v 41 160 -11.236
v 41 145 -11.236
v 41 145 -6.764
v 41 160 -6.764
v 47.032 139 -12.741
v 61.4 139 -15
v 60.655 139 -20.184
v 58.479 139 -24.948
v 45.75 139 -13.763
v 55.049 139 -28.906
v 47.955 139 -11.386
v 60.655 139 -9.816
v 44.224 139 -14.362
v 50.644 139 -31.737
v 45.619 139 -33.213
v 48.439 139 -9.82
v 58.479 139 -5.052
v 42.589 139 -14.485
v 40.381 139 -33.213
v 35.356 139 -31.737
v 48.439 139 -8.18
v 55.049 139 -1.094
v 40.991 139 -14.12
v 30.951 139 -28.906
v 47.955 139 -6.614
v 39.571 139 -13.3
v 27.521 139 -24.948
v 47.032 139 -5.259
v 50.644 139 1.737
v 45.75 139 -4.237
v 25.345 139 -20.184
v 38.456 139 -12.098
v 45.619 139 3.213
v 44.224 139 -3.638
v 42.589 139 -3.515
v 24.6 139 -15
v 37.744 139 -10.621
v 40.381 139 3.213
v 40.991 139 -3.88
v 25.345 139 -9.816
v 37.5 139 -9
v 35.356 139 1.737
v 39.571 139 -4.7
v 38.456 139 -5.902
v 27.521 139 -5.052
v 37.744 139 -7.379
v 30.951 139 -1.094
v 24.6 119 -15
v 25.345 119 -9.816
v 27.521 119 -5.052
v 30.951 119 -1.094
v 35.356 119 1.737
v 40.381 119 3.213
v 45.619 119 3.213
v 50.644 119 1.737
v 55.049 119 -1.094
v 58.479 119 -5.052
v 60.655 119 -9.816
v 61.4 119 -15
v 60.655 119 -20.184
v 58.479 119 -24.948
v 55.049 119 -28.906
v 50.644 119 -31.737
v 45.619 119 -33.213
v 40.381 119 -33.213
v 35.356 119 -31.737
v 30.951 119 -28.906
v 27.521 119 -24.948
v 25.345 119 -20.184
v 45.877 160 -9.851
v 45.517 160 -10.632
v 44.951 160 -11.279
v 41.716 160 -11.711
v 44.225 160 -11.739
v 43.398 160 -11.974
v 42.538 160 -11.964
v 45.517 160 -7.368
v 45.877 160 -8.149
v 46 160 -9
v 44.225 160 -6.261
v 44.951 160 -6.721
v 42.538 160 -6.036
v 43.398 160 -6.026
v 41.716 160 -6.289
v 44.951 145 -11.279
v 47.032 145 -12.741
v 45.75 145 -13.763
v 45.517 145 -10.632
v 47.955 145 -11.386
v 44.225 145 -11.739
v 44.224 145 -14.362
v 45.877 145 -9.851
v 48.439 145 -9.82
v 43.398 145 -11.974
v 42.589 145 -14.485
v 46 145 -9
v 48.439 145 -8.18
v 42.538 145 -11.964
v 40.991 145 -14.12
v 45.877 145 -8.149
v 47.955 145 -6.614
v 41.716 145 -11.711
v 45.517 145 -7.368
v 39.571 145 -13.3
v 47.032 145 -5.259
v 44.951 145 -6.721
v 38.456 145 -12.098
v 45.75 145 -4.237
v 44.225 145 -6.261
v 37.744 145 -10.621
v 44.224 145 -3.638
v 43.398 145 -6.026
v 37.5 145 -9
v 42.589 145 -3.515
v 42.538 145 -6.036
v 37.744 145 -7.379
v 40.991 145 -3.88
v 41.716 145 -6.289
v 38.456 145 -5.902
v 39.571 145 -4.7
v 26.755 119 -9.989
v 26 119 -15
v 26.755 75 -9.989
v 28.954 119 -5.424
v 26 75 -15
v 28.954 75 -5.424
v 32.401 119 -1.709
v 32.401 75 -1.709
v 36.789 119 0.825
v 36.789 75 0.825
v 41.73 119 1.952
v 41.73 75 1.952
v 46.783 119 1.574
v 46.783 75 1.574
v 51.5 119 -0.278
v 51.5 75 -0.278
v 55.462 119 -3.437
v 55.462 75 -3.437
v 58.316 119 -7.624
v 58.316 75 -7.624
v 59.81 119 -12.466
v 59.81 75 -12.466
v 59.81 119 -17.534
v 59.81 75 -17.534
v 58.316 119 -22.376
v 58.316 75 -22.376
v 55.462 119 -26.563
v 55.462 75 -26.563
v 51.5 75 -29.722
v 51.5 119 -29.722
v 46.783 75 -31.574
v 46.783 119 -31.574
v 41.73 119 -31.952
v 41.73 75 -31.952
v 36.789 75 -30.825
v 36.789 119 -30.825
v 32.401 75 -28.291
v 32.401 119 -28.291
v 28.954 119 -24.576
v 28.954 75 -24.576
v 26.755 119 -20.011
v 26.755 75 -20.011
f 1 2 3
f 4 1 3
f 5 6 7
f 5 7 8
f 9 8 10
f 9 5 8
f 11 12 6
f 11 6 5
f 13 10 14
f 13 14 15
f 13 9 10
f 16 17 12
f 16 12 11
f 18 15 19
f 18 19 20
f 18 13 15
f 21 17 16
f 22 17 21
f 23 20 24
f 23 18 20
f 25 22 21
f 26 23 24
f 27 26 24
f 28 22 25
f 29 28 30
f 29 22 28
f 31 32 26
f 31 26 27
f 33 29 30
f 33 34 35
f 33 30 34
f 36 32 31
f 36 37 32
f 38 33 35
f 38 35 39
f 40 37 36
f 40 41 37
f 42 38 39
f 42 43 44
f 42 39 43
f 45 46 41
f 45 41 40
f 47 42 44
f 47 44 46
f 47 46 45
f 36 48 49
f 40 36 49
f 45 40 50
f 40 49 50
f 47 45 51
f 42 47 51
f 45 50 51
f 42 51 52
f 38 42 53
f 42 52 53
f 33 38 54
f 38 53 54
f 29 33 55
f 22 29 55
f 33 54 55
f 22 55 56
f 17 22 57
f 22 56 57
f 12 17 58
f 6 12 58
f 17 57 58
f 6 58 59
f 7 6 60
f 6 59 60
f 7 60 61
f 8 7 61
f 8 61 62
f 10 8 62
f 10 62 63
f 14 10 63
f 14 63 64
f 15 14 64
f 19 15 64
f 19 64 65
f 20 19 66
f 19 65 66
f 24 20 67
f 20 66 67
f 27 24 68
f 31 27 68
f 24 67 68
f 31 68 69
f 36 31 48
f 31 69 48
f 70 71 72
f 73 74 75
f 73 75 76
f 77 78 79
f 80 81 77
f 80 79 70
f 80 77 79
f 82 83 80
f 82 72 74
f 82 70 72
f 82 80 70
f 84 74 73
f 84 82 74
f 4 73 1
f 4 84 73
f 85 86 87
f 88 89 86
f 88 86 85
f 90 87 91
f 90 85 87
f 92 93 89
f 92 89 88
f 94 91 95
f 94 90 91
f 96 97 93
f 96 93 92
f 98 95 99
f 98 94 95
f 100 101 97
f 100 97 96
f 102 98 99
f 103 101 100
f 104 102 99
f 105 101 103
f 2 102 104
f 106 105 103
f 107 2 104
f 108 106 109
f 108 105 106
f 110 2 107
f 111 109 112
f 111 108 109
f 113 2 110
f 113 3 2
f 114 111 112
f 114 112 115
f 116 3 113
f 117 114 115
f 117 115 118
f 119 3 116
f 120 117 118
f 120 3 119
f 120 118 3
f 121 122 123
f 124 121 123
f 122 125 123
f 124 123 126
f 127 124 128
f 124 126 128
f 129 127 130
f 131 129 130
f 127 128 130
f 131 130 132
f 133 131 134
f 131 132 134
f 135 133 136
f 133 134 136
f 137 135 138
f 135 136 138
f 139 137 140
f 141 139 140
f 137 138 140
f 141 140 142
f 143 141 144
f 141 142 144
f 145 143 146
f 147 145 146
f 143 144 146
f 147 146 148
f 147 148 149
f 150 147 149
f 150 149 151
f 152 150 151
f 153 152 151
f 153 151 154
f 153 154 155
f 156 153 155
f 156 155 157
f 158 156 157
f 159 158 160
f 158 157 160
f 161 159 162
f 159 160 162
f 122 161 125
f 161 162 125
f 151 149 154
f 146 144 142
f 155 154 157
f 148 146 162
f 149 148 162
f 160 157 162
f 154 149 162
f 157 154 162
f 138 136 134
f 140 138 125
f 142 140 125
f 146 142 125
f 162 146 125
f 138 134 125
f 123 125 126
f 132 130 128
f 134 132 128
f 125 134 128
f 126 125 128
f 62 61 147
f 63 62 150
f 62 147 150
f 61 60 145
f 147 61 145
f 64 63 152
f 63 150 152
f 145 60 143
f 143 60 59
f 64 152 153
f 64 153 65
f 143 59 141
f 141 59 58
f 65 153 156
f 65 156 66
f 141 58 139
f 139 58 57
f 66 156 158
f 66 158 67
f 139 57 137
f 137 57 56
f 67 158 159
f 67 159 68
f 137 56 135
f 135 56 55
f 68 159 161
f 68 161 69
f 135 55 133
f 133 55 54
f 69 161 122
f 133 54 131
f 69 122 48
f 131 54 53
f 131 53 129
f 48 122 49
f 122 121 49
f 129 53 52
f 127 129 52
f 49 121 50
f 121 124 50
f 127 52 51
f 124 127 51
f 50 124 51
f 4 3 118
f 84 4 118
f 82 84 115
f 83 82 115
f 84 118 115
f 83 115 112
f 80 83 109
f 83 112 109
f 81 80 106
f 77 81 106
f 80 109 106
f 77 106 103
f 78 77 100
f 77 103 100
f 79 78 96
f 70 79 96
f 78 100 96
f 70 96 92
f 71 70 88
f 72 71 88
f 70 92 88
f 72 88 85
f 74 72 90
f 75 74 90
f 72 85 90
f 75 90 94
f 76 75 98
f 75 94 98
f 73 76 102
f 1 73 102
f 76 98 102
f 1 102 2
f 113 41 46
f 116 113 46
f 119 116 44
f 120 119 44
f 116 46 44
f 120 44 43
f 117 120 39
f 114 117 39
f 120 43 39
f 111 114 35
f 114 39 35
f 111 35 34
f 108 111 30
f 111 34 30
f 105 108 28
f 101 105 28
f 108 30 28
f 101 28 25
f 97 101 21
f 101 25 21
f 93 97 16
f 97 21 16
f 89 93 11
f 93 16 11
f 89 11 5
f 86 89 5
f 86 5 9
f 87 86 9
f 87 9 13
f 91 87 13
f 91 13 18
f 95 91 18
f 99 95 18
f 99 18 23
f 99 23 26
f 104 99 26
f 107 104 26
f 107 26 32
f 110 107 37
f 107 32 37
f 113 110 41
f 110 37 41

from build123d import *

# Parameters (mm, degrees)
CYLINDER019_R             = 17
CYLINDER019_DEPTH         = 14
CYLINDER020_R             = 5.5
CYLINDER020_DEPTH         = 6
CYLINDER018_R             = 17
CYLINDER018_DEPTH         = 30
BOX003_W                  = 11
BOX003_H                  = 10
BOX003_DEPTH              = 21
CYLINDER021_R             = 3
CYLINDER021_DEPTH         = 15
CYLINDER017_R             = 18.4
CYLINDER017_DEPTH         = 20
FUSION003_ROLL_ANGLE      = 90
FUSION003_PLACEMENT_ANGLE = 180


with BuildPart() as encoder002:
    # Cylinder019 → Cylinder019 (new body)
    with BuildSketch(Plane(origin=(0, -298, 0), x_dir=(1, 0, 0), z_dir=(0, 0, 1))):
        Circle(CYLINDER019_R)
    extrude(amount=CYLINDER019_DEPTH)


with BuildPart() as cilindro004:
    # Cylinder020 → Cylinder020 (new body)
    with BuildSketch(Plane(origin=(0, -292, 64), x_dir=(1, 0, 0), z_dir=(0, 0, 1))):
        Circle(CYLINDER020_R)
    extrude(amount=CYLINDER020_DEPTH)


with BuildPart() as motor002:
    # Cylinder018 → Cylinder018 (new body)
    with BuildSketch(Plane(origin=(0, -298, 14), x_dir=(1, 0, 0), z_dir=(0, 0, 1))):
        Circle(CYLINDER018_R)
    extrude(amount=CYLINDER018_DEPTH)


with BuildPart() as cubo002:
    # Box003 → Box003 (new body)
    with BuildSketch(Plane(origin=(2, -191, -2), x_dir=(1, 0, 0), z_dir=(0, 0, 1))):
        with Locations((5.5, 5)):
            Rectangle(BOX003_W, BOX003_H)
    extrude(amount=BOX003_DEPTH)


with BuildPart() as cut002:
    # Cylinder021 → Cylinder021 (new body)
    with BuildSketch(Plane(origin=(0, -186, 0), x_dir=(1, 0, 0), z_dir=(0, 0, 1))):
        Circle(CYLINDER021_R)
    extrude(amount=CYLINDER021_DEPTH)

    # Cut002: cut Cubo002
    add(cubo002.part, mode=Mode.SUBTRACT)


with BuildPart() as cut002_1:
    # Cut002 placement: moved
    add(cut002.part.moved(Location((0, -106, 70))))


with BuildPart() as motor_37dx68l001_izquierda001:
    # Cylinder017 → Cylinder017 (new body)
    with BuildSketch(Plane(origin=(0, -298, 44), x_dir=(1, 0, 0), z_dir=(0, 0, 1))):
        Circle(CYLINDER017_R)
    extrude(amount=CYLINDER017_DEPTH)

    # Fusion003: union Encoder002, Cilindro004, Motor002, Cut002
    add(encoder002.part)
    add(cilindro004.part)
    add(motor002.part)
    add(cut002_1.part)


with BuildPart() as motor_37dx68l001_izquierda001_1:
    # Fusion003 roll: moved
    add(motor_37dx68l001_izquierda001.part.rotate(Axis((0, 0, 0), (1, 0, 0)), FUSION003_ROLL_ANGLE))


with BuildPart() as motor_37dx68l001_izquierda001_2:
    # Fusion003 placement: moved
    add(motor_37dx68l001_izquierda001_1.part.moved(Location((43, 75, 283))).rotate(Axis((43, 75, 283), (0, 0, 1)), FUSION003_PLACEMENT_ANGLE))


solid = motor_37dx68l001_izquierda001_2.part
